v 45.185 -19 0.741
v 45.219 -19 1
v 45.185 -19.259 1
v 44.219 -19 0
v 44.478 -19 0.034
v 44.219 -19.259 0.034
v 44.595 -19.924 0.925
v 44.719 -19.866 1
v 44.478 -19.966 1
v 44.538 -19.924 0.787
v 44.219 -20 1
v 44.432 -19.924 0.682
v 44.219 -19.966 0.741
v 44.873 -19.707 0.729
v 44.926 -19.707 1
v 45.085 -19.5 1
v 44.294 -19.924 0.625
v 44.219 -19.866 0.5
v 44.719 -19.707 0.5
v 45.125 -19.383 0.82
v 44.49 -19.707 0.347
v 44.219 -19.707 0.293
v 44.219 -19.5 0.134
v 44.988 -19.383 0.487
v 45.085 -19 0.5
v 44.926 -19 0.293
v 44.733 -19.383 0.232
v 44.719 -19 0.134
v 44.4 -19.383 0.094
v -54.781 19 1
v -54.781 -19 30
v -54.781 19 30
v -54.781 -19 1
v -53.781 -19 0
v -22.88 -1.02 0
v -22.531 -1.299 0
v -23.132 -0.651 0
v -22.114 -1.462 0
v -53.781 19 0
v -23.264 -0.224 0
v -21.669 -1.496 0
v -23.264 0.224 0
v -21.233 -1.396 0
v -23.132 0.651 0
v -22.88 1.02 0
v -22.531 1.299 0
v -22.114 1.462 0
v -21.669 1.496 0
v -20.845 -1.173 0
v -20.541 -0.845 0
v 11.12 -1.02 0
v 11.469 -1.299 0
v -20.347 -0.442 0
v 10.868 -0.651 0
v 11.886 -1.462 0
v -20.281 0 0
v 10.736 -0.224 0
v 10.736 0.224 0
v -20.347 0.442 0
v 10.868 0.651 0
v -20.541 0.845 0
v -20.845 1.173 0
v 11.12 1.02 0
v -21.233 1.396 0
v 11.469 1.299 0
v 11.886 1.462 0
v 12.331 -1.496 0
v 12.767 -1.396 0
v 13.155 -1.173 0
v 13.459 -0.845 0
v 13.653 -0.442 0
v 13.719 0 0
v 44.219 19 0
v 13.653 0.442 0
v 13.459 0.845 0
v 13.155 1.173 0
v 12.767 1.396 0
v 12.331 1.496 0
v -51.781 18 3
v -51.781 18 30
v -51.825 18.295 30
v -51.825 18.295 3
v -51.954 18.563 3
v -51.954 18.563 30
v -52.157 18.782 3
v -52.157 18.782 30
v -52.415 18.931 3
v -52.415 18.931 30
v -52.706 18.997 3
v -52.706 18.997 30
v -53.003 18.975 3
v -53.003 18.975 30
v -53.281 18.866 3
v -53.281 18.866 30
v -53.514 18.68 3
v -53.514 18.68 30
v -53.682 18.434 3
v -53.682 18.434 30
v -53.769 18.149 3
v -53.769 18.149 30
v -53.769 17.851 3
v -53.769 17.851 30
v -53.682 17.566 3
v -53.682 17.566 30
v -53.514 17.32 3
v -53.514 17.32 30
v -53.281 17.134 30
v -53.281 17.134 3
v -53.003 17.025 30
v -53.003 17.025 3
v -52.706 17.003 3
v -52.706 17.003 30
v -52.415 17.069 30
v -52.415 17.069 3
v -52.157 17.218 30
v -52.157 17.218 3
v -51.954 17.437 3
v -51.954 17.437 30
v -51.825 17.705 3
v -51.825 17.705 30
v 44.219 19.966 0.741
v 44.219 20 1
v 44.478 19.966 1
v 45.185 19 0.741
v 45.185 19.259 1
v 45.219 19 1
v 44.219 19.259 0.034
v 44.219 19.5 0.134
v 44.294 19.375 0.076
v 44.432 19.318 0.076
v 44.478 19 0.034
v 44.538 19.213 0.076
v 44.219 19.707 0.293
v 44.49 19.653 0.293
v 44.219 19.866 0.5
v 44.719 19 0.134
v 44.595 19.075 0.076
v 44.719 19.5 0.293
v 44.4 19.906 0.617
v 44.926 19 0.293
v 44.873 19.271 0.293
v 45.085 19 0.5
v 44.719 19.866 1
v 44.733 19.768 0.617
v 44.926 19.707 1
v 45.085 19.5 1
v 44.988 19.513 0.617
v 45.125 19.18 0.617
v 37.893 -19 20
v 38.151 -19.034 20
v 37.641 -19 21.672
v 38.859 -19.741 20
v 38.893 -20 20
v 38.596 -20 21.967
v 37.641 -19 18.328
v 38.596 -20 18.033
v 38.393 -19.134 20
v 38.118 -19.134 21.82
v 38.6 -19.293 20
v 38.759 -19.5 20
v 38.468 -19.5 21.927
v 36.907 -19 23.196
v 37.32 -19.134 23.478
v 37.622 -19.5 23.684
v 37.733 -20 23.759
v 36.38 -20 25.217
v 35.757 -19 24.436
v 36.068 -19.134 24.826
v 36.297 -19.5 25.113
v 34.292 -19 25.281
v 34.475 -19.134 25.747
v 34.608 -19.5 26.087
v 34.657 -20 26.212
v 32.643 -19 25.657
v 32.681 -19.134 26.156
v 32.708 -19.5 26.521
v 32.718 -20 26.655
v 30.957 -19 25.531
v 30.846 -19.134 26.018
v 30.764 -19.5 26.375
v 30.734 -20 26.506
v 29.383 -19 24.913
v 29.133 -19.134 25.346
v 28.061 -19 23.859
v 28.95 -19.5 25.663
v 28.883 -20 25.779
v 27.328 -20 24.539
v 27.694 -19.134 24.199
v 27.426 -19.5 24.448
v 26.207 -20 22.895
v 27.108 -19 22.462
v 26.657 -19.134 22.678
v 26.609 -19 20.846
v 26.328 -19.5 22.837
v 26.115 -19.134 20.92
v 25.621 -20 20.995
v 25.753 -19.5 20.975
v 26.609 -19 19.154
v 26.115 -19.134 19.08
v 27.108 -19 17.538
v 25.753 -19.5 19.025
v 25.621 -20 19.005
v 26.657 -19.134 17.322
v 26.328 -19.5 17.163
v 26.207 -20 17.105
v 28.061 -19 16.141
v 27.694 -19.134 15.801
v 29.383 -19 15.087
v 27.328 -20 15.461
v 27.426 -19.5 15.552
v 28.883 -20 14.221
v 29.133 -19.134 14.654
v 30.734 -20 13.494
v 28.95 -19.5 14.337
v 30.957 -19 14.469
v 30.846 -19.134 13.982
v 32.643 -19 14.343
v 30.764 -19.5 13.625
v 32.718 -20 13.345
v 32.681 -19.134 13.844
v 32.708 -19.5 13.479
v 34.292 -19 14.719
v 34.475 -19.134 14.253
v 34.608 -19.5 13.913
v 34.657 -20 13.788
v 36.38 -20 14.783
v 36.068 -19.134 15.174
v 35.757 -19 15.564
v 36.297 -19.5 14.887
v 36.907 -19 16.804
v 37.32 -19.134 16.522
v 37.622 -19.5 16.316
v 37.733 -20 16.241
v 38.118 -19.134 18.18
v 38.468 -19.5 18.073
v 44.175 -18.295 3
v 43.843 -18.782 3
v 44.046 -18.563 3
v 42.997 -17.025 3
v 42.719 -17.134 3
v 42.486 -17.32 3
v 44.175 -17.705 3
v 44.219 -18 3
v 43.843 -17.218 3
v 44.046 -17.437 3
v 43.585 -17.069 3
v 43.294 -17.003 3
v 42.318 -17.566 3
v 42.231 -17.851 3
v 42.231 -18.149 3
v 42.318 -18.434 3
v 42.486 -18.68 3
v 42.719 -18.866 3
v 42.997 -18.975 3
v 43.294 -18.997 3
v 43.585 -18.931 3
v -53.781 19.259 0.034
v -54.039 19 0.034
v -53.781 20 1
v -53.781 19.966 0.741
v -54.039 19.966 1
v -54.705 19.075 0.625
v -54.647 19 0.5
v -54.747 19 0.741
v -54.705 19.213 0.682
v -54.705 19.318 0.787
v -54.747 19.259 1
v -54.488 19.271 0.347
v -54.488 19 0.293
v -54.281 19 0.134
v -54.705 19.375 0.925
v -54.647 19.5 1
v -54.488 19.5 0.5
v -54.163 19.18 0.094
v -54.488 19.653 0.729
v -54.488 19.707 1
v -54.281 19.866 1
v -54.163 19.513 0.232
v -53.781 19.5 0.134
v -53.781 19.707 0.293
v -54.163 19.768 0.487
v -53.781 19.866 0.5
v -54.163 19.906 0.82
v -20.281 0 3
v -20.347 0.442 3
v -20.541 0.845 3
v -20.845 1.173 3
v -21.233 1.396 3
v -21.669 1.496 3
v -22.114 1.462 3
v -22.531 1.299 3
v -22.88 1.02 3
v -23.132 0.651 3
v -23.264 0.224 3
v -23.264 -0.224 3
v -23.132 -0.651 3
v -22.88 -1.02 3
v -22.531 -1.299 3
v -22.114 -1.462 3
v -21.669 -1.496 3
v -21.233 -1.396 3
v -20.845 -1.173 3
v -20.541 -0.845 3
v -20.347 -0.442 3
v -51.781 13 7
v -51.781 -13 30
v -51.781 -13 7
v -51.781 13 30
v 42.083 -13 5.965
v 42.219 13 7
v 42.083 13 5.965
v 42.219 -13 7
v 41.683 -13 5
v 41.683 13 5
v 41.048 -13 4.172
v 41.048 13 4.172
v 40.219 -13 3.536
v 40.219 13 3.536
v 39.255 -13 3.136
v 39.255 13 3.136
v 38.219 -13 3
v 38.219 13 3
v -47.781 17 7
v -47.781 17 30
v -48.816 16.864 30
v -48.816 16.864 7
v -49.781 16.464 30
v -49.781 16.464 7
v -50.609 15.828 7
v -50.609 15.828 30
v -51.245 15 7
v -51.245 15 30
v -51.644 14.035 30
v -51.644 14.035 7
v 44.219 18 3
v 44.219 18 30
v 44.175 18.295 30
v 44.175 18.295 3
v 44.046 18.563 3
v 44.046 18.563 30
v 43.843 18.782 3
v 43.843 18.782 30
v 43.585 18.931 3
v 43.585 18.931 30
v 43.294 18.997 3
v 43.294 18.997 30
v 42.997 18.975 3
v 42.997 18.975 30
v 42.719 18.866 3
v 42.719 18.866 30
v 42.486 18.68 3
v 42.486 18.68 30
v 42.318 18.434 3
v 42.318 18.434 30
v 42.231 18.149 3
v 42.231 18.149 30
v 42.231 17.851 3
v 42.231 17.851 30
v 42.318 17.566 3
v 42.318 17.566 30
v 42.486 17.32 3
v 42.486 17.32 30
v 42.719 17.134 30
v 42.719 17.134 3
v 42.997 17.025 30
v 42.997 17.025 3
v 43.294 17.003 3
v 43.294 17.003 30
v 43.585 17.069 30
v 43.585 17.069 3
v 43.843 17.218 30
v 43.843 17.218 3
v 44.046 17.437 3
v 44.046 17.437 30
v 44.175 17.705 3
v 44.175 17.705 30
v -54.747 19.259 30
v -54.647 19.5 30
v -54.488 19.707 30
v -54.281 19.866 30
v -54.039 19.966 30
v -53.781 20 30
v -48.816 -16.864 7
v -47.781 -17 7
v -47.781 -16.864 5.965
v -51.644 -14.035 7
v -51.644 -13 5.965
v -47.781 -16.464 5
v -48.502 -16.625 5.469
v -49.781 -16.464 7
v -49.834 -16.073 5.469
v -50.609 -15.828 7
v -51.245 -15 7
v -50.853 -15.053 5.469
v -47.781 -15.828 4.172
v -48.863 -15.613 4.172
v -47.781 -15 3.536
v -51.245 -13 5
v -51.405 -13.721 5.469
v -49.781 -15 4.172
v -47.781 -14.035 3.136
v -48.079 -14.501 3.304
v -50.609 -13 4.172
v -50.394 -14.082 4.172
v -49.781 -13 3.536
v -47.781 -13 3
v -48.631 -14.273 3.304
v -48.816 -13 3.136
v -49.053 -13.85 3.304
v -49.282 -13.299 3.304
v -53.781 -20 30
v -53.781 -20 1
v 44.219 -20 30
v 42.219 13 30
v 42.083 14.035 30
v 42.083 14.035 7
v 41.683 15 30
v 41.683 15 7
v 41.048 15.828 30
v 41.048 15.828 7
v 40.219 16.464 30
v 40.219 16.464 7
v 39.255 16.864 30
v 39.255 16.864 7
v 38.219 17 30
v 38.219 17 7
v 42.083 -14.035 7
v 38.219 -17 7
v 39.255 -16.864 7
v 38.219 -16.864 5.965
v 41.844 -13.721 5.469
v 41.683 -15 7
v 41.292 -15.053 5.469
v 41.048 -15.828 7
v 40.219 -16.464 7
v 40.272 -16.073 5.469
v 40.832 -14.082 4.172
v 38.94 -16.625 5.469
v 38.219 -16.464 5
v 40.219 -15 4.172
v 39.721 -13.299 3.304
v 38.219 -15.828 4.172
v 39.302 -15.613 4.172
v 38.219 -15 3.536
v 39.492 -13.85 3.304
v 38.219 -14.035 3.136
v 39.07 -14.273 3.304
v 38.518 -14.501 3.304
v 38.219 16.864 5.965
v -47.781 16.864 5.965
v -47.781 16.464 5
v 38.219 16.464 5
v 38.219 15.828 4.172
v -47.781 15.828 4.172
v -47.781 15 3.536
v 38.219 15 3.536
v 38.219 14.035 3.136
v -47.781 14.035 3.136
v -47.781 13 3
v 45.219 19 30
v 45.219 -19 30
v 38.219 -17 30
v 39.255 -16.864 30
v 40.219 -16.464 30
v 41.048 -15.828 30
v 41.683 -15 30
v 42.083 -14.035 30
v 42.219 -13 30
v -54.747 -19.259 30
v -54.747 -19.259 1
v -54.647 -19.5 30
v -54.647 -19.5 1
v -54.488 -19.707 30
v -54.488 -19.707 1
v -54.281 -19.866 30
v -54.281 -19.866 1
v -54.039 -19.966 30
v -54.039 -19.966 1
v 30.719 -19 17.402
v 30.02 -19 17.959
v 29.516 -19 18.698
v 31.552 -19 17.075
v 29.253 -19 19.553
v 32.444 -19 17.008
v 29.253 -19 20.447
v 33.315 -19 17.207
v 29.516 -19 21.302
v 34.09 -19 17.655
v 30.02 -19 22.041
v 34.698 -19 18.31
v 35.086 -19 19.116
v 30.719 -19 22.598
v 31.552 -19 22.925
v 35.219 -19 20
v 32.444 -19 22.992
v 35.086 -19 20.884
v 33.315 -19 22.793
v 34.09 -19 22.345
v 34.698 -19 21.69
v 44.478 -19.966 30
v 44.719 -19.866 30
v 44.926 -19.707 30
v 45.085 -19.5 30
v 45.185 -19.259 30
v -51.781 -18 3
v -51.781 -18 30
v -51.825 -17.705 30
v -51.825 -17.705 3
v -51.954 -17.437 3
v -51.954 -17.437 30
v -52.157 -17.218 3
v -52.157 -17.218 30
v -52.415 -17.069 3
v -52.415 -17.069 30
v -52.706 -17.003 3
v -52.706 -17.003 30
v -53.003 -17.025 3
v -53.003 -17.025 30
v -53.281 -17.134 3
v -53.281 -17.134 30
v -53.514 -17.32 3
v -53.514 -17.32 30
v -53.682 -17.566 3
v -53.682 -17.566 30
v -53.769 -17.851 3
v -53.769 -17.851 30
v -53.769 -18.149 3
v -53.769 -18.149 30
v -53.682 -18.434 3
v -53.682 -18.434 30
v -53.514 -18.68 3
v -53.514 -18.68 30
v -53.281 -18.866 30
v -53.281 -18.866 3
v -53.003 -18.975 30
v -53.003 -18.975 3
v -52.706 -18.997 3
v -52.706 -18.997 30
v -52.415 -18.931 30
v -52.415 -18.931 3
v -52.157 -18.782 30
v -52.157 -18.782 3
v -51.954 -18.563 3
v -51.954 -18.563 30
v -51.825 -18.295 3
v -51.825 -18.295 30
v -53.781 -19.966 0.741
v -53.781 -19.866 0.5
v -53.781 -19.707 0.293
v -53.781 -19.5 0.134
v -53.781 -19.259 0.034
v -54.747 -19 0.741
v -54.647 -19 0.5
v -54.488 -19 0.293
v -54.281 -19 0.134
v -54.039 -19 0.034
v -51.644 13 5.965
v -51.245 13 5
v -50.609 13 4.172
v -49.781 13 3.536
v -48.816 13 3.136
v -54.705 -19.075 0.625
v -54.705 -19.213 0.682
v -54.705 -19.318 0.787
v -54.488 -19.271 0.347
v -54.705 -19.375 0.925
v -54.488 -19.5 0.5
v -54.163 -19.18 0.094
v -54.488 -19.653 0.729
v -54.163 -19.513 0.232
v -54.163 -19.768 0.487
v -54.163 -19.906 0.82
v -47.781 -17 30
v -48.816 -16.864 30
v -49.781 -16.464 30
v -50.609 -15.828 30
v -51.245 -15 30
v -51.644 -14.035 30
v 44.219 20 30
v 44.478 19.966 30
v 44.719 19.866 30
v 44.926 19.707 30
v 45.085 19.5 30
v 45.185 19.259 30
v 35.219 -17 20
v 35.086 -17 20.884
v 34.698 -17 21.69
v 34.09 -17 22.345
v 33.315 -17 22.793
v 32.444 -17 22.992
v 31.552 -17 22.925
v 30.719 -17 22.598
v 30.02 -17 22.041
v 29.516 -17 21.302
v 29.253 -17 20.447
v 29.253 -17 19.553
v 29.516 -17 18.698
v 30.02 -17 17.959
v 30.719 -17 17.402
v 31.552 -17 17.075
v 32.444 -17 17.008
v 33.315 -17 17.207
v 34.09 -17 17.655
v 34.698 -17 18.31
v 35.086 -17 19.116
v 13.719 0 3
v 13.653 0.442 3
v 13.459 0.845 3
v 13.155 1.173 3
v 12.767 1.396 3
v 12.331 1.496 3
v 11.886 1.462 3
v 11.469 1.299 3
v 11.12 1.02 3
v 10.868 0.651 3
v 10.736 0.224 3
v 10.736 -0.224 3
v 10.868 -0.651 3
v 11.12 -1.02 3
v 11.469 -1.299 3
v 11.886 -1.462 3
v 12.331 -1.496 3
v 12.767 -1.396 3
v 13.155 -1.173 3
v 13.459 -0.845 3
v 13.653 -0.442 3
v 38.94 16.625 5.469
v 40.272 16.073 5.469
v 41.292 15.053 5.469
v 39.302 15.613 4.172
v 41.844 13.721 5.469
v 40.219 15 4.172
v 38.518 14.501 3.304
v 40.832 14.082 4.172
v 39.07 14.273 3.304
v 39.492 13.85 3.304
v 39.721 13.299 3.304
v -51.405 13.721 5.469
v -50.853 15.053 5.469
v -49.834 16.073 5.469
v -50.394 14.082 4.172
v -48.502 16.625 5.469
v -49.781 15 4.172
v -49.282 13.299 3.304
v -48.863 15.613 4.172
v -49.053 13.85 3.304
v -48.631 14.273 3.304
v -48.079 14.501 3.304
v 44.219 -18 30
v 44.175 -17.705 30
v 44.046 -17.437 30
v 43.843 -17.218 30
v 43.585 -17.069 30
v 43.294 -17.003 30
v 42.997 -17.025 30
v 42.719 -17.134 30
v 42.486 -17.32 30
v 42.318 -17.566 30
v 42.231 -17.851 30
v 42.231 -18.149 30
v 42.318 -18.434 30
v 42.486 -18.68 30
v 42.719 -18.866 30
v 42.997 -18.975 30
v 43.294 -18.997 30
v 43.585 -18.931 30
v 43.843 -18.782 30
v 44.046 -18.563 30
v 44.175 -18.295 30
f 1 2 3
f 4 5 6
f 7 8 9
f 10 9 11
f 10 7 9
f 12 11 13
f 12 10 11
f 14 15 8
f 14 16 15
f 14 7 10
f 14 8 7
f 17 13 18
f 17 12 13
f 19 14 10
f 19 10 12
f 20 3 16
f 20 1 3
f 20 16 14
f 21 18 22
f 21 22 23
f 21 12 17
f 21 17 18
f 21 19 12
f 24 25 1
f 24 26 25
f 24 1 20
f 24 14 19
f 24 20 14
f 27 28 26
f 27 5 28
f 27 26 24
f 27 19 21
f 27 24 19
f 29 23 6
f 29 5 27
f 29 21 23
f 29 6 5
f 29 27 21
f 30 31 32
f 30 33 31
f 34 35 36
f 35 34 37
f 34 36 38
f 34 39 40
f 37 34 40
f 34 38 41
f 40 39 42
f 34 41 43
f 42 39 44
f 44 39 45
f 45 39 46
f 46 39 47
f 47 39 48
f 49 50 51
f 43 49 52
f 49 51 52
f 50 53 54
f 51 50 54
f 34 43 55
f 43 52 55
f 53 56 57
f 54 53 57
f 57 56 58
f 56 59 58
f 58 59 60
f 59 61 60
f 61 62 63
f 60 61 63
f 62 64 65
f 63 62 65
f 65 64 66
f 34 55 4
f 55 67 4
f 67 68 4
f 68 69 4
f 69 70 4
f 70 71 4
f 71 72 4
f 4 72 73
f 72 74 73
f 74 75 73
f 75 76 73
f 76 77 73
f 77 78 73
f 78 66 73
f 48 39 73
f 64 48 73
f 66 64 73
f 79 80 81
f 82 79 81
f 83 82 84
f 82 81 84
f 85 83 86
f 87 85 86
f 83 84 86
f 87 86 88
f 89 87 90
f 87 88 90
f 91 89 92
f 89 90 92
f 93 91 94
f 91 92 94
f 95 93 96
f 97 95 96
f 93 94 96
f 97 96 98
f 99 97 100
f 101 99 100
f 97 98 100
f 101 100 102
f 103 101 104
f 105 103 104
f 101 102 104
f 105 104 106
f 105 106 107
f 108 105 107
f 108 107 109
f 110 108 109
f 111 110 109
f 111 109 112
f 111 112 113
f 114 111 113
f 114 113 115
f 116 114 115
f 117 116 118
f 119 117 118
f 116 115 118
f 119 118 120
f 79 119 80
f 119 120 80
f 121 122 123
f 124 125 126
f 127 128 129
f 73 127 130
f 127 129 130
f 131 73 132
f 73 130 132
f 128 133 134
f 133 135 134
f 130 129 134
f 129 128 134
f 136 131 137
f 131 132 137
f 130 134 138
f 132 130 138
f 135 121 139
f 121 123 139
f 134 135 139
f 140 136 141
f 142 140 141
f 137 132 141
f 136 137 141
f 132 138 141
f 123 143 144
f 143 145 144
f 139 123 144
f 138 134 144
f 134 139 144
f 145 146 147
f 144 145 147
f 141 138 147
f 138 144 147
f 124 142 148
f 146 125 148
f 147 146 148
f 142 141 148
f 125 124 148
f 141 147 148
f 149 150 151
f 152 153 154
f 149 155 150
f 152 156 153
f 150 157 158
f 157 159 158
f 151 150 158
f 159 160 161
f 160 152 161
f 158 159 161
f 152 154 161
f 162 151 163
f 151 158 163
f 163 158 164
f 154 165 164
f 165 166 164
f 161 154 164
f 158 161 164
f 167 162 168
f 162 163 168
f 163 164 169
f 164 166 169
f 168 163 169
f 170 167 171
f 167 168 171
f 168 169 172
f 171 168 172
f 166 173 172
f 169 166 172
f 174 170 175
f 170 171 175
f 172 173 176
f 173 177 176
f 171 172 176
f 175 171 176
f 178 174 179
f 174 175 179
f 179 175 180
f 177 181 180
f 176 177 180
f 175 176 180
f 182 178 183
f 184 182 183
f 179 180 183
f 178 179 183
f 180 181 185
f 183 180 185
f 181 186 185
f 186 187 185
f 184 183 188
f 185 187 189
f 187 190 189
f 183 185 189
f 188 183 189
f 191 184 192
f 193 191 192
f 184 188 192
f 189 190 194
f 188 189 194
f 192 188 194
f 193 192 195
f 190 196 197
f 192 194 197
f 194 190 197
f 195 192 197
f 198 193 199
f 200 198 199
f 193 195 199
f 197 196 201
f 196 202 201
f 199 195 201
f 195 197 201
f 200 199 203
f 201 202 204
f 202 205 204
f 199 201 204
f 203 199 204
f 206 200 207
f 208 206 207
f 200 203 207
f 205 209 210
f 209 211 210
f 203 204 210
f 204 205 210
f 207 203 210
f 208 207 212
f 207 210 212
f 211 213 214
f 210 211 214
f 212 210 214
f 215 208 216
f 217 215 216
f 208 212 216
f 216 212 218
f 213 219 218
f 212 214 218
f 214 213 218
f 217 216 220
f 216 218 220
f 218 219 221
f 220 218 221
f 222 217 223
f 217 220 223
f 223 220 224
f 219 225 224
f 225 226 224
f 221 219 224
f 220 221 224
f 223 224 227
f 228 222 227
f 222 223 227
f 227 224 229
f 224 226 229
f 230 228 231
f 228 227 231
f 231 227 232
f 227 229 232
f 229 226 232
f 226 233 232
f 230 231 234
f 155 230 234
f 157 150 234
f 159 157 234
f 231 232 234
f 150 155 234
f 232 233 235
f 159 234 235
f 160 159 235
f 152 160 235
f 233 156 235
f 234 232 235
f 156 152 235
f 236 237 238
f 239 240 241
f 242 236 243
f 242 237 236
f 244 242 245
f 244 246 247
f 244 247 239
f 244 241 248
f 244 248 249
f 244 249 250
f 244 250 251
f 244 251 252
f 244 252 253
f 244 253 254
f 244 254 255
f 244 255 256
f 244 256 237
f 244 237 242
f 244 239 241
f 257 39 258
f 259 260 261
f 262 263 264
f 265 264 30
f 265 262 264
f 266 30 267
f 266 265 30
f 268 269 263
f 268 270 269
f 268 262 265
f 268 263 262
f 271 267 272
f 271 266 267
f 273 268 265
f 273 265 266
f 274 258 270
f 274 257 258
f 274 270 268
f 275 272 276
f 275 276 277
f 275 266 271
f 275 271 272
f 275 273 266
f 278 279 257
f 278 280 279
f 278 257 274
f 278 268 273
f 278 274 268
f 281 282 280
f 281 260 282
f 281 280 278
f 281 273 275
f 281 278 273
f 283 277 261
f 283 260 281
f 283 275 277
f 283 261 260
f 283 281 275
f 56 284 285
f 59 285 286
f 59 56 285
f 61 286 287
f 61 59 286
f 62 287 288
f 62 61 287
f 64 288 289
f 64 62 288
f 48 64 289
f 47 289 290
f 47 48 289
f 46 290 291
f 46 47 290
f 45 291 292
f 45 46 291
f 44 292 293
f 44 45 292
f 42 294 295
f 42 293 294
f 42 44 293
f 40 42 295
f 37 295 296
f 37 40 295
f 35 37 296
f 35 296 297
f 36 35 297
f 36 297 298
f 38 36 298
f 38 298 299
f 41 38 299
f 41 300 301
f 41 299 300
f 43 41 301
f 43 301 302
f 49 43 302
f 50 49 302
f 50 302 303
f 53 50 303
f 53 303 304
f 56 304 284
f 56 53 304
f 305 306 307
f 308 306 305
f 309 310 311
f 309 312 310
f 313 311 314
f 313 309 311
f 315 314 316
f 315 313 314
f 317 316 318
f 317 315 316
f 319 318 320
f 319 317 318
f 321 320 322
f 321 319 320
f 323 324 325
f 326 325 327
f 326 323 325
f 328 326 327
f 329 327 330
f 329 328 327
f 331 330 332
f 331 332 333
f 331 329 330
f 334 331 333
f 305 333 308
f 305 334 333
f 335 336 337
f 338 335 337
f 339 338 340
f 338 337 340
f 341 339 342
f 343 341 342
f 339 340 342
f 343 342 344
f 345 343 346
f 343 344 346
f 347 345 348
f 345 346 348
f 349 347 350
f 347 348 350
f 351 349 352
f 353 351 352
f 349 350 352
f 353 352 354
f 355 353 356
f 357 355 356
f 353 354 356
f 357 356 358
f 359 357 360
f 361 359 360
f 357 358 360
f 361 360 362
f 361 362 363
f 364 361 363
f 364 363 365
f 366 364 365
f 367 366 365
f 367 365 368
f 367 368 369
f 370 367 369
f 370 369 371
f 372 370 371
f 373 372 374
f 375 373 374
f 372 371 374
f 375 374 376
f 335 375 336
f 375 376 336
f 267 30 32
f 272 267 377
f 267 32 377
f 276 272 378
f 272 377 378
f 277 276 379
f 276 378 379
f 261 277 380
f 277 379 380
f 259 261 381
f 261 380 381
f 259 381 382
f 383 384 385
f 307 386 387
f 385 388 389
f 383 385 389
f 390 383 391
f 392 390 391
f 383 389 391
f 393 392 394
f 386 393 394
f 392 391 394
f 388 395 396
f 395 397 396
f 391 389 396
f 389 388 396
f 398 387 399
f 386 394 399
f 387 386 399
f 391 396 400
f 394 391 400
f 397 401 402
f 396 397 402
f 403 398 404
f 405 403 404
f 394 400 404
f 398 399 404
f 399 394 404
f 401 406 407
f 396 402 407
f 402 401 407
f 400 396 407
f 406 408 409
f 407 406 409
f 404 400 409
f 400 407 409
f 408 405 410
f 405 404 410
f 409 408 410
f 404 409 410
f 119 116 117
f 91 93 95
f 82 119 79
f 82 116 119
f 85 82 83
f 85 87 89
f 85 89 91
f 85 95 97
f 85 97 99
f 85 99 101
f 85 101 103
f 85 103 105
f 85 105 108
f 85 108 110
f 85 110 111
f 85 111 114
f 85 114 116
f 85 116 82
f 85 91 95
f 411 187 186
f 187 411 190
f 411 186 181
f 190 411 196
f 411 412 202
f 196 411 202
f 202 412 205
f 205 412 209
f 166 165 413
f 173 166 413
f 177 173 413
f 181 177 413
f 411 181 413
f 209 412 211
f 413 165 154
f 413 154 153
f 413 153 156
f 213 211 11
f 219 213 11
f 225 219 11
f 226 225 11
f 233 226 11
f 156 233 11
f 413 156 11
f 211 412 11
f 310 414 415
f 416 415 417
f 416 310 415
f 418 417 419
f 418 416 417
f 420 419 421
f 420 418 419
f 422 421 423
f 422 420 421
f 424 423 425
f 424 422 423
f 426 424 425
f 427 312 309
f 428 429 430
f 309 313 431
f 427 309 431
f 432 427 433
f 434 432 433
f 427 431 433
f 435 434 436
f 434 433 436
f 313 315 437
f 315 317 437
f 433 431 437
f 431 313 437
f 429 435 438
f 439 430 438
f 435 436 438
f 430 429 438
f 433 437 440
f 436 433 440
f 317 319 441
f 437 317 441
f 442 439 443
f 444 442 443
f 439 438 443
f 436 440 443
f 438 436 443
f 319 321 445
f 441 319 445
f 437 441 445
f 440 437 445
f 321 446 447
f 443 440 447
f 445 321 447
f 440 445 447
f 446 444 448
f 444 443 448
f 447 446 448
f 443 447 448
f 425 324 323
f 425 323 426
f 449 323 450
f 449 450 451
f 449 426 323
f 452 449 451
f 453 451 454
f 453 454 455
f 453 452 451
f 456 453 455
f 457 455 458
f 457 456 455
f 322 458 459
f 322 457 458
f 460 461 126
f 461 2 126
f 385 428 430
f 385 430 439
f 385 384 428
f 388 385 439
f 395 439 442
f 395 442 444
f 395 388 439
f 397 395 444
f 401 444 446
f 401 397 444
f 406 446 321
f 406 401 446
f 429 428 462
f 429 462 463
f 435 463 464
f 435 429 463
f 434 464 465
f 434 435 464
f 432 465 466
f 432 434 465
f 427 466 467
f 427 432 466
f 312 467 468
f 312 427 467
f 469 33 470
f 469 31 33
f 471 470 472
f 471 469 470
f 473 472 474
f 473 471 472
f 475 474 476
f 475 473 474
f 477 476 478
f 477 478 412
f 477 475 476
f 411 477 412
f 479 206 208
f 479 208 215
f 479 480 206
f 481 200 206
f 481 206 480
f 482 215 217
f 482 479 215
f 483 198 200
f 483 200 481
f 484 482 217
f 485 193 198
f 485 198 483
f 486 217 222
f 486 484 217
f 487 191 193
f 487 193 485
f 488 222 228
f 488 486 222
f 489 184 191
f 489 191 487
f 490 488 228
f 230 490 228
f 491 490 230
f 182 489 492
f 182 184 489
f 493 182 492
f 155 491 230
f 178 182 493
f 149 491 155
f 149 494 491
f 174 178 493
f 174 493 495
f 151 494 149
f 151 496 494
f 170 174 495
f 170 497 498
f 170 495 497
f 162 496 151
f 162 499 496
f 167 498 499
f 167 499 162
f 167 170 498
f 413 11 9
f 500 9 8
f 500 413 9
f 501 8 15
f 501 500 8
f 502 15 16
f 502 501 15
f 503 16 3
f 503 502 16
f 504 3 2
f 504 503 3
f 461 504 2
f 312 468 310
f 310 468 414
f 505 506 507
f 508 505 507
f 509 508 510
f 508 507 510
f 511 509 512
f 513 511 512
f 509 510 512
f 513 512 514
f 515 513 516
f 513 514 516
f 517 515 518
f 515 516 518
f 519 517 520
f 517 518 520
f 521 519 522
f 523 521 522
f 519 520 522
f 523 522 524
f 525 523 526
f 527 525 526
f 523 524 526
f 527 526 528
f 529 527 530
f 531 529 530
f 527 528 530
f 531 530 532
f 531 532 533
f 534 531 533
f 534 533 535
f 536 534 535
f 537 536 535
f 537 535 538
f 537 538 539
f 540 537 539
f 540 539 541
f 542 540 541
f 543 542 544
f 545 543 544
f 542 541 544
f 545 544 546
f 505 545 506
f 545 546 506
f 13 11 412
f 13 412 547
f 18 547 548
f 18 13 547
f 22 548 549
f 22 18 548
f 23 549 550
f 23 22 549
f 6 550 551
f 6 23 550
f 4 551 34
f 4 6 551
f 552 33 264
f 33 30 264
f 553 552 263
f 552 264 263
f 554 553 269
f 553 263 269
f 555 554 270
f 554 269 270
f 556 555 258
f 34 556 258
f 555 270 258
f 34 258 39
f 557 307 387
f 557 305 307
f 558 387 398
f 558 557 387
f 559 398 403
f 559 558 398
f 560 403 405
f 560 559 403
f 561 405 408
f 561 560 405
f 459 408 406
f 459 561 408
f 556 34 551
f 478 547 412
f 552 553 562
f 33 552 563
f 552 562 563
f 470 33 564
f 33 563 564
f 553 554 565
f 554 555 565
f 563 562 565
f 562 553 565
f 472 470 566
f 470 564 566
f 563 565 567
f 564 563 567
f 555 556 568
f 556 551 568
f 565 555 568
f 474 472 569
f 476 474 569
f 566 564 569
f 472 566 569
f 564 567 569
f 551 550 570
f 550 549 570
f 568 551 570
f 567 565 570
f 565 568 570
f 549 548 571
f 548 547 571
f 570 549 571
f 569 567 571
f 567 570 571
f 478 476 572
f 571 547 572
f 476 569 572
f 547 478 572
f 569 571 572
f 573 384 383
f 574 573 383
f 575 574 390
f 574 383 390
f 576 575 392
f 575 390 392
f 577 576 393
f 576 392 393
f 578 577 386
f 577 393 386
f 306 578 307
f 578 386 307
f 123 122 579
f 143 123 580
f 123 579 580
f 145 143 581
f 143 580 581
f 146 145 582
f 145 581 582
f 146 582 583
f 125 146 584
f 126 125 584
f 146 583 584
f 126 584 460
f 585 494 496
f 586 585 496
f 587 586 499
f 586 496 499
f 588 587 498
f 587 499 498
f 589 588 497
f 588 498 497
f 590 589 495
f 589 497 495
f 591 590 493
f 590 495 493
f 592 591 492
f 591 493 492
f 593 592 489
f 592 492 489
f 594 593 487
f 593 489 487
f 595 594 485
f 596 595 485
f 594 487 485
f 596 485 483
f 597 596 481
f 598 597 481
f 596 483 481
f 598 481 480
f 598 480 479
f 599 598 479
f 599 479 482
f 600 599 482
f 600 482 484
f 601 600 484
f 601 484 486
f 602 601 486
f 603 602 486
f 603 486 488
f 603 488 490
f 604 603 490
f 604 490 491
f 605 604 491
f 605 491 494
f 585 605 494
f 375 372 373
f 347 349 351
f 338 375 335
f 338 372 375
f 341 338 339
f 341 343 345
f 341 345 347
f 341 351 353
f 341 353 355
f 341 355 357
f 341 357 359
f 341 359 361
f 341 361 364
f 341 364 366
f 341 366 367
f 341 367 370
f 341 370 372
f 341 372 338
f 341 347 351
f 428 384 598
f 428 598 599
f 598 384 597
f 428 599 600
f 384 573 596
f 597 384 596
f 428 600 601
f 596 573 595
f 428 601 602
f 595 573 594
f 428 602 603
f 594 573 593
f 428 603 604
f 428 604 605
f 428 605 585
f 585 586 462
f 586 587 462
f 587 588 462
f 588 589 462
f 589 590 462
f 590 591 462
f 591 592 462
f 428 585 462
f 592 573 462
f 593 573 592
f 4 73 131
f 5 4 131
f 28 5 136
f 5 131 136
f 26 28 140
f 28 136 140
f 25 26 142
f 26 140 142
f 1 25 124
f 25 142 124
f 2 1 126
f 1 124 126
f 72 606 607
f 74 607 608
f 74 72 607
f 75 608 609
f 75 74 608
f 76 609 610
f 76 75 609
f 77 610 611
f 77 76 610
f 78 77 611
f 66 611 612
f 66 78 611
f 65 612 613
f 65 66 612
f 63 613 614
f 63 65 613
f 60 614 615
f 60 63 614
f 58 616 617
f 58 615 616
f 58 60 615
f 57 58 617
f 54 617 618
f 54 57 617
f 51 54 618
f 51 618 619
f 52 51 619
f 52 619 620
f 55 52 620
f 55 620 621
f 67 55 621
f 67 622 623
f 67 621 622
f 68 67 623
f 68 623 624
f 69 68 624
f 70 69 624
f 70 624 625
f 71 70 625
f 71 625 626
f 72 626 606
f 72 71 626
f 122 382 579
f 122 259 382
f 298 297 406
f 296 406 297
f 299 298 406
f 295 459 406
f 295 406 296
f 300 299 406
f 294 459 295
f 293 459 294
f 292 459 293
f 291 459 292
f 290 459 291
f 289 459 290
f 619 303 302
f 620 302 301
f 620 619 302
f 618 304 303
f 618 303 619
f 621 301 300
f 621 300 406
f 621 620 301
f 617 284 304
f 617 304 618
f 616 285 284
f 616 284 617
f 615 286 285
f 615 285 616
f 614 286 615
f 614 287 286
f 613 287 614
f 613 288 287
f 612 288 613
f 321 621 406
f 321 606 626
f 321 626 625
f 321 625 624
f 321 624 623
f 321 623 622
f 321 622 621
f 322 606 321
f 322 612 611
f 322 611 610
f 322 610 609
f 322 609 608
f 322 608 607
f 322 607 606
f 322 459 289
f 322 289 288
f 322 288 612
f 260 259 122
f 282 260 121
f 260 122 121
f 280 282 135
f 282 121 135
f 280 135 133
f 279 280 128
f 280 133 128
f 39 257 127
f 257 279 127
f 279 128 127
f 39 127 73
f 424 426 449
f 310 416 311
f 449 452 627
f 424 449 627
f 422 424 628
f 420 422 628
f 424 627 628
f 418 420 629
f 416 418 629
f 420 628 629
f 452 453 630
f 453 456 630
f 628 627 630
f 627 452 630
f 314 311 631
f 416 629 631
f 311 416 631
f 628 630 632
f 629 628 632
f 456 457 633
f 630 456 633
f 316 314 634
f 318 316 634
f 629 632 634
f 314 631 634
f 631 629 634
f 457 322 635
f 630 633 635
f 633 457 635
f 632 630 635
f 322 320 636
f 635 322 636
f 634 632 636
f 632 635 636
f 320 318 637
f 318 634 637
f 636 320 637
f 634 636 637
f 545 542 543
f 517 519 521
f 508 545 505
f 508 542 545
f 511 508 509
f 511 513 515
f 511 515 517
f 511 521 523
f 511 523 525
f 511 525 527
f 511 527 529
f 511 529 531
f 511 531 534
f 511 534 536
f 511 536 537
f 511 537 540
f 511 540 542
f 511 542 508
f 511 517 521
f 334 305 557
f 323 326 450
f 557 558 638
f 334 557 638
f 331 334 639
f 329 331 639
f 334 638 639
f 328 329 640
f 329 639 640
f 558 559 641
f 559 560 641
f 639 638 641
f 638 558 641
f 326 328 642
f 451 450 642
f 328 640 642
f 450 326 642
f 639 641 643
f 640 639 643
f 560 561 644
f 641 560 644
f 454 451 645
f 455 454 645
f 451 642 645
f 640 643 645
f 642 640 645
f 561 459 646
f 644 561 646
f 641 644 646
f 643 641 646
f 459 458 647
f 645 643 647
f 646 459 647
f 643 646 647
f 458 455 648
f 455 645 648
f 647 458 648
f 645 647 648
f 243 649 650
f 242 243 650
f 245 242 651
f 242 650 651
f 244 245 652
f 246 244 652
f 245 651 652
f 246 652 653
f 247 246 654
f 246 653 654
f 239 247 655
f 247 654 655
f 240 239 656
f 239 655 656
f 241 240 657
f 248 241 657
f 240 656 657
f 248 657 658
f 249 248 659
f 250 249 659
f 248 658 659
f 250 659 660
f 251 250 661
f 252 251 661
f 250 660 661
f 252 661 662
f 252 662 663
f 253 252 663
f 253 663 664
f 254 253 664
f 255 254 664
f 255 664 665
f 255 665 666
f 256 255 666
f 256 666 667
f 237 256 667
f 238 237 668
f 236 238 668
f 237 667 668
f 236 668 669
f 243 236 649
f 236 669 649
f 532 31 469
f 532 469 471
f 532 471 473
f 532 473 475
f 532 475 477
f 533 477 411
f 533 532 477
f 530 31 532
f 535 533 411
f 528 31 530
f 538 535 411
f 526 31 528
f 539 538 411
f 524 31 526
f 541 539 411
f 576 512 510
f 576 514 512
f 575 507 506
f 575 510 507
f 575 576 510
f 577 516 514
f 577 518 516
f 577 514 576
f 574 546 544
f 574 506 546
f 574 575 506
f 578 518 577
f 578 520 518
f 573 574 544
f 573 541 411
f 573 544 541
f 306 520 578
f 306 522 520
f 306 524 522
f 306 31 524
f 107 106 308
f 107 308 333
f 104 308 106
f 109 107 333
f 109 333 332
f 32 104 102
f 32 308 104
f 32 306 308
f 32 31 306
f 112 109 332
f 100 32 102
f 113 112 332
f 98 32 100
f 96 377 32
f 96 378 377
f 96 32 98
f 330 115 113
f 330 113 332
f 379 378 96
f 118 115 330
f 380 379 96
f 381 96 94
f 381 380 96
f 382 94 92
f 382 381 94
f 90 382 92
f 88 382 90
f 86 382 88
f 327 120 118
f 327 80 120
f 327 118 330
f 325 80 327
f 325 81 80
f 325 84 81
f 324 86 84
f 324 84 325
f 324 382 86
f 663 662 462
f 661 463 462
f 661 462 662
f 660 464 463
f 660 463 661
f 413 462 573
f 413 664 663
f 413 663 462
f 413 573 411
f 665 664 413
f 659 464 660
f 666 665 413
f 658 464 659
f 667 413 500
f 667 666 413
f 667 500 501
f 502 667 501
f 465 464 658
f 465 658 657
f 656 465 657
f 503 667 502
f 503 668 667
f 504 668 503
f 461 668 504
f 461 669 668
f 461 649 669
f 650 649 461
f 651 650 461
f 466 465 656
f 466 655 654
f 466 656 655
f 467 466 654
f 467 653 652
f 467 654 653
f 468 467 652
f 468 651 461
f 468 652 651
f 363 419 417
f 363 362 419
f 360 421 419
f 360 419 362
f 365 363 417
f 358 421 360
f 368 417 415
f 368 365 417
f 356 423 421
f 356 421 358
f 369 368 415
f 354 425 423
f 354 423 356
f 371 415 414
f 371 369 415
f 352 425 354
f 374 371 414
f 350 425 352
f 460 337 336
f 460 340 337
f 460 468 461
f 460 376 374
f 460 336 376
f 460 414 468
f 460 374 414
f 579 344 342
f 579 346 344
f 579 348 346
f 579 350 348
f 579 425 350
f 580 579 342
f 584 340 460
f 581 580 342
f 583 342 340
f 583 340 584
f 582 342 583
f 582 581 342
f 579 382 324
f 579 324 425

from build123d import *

# Parameters (mm, degrees)
F0_W      = 100
F0_H      = 40
F0_R      = 1.5
F1_DEPTH  = 30
F2_W      = 94
F2_H      = 34
F2_R      = 1
F3_DEPTH  = 27
F4_R      = 3
F5_DEPTH  = 5
F6_R      = 1
F7_R      = 4
F8_R      = 4
F9_R      = 6.6732690133
F10_DEPTH = 1
F11_R     = 0.99999


# Not quite as in the source:
# - a fillet or chamfer is up to 0.001 mm smaller than in the source, because OpenCascade refuses the exact size


with BuildPart() as f1:
    # F0 (on Top) → F1 (new body)
    with BuildSketch(Plane.XY):
        with Locations((-4.7806398869, -4.191e-06)):
            Rectangle(F0_W, F0_H)
        with Locations((-21.7806398869, 0)):
            Circle(F0_R, mode=Mode.SUBTRACT)
        with Locations((12.2193601131, 0)):
            Circle(F0_R, mode=Mode.SUBTRACT)
    extrude(amount=F1_DEPTH)

    # F2 (on face) → F3 (cut)
    with BuildSketch(Plane.XY.offset(30)):
        with Locations((-4.7806398869, -4.191e-06)):
            Rectangle(F2_W, F2_H)
        with Locations((-52.7806398869, 17.999995809)):
            Circle(F2_R)
        with Locations((-52.7806398869, -18.000004191)):
            Circle(F2_R)
        with Locations((43.2193601131, 17.999995809)):
            Circle(F2_R)
        with Locations((43.2193601131, -18.000004191)):
            Circle(F2_R)
    extrude(amount=-F3_DEPTH, mode=Mode.SUBTRACT)

    # F4 (on face) → F5 (cut)
    with BuildSketch(Plane.XZ.offset(20.000004191)):
        with Locations((32.2193601131, 20)):
            Circle(F4_R)
    extrude(amount=-F5_DEPTH, mode=Mode.SUBTRACT)

    # F6
    f6_edges = [f1.edges().sort_by_distance(p)[0] for p in [
        (45.21936, 19.999996, 15),
        (-4.78064, 19.999996, 0),
        (45.21936, -4e-06, 0),
        (45.21936, -20.000004, 15),
        (-4.78064, -20.000004, 0),
        (-54.78064, -4e-06, 0),
        (-54.78064, 19.999996, 15),
        (-54.78064, -20.000004, 15),
    ]]
    fillet(f6_edges, radius=F6_R)

    # F7
    f7_edges = [f1.edges().sort_by_distance(p)[0] for p in [
        (42.21936, 16.999996, 16.5),
        (-51.78064, 16.999996, 16.5),
        (-51.78064, -17.000004, 16.5),
        (42.21936, -17.000004, 16.5),
    ]]
    fillet(f7_edges, radius=F7_R)

    # F8
    f8_edges = [f1.edges().sort_by_distance(p)[0] for p in [
        (-4.78064, 16.999996, 3),
    ]]
    fillet(f8_edges, radius=F8_R)

    # F9 (on face) → F10 (cut)
    with BuildSketch(Plane.XZ.offset(20.000004191)):
        with Locations((32.2193601131, 20)):
            Circle(F9_R)
    extrude(amount=-F10_DEPTH, mode=Mode.SUBTRACT)

    # F11 (radius 1 in the source; OpenCascade refuses exactly that, so slightly less here)
    f11_edges = [f1.edges().sort_by_distance(p)[0] for p in [
        (25.546091, -19.000004, 20),
    ]]
    fillet(f11_edges, radius=F11_R)


solid = f1.part
